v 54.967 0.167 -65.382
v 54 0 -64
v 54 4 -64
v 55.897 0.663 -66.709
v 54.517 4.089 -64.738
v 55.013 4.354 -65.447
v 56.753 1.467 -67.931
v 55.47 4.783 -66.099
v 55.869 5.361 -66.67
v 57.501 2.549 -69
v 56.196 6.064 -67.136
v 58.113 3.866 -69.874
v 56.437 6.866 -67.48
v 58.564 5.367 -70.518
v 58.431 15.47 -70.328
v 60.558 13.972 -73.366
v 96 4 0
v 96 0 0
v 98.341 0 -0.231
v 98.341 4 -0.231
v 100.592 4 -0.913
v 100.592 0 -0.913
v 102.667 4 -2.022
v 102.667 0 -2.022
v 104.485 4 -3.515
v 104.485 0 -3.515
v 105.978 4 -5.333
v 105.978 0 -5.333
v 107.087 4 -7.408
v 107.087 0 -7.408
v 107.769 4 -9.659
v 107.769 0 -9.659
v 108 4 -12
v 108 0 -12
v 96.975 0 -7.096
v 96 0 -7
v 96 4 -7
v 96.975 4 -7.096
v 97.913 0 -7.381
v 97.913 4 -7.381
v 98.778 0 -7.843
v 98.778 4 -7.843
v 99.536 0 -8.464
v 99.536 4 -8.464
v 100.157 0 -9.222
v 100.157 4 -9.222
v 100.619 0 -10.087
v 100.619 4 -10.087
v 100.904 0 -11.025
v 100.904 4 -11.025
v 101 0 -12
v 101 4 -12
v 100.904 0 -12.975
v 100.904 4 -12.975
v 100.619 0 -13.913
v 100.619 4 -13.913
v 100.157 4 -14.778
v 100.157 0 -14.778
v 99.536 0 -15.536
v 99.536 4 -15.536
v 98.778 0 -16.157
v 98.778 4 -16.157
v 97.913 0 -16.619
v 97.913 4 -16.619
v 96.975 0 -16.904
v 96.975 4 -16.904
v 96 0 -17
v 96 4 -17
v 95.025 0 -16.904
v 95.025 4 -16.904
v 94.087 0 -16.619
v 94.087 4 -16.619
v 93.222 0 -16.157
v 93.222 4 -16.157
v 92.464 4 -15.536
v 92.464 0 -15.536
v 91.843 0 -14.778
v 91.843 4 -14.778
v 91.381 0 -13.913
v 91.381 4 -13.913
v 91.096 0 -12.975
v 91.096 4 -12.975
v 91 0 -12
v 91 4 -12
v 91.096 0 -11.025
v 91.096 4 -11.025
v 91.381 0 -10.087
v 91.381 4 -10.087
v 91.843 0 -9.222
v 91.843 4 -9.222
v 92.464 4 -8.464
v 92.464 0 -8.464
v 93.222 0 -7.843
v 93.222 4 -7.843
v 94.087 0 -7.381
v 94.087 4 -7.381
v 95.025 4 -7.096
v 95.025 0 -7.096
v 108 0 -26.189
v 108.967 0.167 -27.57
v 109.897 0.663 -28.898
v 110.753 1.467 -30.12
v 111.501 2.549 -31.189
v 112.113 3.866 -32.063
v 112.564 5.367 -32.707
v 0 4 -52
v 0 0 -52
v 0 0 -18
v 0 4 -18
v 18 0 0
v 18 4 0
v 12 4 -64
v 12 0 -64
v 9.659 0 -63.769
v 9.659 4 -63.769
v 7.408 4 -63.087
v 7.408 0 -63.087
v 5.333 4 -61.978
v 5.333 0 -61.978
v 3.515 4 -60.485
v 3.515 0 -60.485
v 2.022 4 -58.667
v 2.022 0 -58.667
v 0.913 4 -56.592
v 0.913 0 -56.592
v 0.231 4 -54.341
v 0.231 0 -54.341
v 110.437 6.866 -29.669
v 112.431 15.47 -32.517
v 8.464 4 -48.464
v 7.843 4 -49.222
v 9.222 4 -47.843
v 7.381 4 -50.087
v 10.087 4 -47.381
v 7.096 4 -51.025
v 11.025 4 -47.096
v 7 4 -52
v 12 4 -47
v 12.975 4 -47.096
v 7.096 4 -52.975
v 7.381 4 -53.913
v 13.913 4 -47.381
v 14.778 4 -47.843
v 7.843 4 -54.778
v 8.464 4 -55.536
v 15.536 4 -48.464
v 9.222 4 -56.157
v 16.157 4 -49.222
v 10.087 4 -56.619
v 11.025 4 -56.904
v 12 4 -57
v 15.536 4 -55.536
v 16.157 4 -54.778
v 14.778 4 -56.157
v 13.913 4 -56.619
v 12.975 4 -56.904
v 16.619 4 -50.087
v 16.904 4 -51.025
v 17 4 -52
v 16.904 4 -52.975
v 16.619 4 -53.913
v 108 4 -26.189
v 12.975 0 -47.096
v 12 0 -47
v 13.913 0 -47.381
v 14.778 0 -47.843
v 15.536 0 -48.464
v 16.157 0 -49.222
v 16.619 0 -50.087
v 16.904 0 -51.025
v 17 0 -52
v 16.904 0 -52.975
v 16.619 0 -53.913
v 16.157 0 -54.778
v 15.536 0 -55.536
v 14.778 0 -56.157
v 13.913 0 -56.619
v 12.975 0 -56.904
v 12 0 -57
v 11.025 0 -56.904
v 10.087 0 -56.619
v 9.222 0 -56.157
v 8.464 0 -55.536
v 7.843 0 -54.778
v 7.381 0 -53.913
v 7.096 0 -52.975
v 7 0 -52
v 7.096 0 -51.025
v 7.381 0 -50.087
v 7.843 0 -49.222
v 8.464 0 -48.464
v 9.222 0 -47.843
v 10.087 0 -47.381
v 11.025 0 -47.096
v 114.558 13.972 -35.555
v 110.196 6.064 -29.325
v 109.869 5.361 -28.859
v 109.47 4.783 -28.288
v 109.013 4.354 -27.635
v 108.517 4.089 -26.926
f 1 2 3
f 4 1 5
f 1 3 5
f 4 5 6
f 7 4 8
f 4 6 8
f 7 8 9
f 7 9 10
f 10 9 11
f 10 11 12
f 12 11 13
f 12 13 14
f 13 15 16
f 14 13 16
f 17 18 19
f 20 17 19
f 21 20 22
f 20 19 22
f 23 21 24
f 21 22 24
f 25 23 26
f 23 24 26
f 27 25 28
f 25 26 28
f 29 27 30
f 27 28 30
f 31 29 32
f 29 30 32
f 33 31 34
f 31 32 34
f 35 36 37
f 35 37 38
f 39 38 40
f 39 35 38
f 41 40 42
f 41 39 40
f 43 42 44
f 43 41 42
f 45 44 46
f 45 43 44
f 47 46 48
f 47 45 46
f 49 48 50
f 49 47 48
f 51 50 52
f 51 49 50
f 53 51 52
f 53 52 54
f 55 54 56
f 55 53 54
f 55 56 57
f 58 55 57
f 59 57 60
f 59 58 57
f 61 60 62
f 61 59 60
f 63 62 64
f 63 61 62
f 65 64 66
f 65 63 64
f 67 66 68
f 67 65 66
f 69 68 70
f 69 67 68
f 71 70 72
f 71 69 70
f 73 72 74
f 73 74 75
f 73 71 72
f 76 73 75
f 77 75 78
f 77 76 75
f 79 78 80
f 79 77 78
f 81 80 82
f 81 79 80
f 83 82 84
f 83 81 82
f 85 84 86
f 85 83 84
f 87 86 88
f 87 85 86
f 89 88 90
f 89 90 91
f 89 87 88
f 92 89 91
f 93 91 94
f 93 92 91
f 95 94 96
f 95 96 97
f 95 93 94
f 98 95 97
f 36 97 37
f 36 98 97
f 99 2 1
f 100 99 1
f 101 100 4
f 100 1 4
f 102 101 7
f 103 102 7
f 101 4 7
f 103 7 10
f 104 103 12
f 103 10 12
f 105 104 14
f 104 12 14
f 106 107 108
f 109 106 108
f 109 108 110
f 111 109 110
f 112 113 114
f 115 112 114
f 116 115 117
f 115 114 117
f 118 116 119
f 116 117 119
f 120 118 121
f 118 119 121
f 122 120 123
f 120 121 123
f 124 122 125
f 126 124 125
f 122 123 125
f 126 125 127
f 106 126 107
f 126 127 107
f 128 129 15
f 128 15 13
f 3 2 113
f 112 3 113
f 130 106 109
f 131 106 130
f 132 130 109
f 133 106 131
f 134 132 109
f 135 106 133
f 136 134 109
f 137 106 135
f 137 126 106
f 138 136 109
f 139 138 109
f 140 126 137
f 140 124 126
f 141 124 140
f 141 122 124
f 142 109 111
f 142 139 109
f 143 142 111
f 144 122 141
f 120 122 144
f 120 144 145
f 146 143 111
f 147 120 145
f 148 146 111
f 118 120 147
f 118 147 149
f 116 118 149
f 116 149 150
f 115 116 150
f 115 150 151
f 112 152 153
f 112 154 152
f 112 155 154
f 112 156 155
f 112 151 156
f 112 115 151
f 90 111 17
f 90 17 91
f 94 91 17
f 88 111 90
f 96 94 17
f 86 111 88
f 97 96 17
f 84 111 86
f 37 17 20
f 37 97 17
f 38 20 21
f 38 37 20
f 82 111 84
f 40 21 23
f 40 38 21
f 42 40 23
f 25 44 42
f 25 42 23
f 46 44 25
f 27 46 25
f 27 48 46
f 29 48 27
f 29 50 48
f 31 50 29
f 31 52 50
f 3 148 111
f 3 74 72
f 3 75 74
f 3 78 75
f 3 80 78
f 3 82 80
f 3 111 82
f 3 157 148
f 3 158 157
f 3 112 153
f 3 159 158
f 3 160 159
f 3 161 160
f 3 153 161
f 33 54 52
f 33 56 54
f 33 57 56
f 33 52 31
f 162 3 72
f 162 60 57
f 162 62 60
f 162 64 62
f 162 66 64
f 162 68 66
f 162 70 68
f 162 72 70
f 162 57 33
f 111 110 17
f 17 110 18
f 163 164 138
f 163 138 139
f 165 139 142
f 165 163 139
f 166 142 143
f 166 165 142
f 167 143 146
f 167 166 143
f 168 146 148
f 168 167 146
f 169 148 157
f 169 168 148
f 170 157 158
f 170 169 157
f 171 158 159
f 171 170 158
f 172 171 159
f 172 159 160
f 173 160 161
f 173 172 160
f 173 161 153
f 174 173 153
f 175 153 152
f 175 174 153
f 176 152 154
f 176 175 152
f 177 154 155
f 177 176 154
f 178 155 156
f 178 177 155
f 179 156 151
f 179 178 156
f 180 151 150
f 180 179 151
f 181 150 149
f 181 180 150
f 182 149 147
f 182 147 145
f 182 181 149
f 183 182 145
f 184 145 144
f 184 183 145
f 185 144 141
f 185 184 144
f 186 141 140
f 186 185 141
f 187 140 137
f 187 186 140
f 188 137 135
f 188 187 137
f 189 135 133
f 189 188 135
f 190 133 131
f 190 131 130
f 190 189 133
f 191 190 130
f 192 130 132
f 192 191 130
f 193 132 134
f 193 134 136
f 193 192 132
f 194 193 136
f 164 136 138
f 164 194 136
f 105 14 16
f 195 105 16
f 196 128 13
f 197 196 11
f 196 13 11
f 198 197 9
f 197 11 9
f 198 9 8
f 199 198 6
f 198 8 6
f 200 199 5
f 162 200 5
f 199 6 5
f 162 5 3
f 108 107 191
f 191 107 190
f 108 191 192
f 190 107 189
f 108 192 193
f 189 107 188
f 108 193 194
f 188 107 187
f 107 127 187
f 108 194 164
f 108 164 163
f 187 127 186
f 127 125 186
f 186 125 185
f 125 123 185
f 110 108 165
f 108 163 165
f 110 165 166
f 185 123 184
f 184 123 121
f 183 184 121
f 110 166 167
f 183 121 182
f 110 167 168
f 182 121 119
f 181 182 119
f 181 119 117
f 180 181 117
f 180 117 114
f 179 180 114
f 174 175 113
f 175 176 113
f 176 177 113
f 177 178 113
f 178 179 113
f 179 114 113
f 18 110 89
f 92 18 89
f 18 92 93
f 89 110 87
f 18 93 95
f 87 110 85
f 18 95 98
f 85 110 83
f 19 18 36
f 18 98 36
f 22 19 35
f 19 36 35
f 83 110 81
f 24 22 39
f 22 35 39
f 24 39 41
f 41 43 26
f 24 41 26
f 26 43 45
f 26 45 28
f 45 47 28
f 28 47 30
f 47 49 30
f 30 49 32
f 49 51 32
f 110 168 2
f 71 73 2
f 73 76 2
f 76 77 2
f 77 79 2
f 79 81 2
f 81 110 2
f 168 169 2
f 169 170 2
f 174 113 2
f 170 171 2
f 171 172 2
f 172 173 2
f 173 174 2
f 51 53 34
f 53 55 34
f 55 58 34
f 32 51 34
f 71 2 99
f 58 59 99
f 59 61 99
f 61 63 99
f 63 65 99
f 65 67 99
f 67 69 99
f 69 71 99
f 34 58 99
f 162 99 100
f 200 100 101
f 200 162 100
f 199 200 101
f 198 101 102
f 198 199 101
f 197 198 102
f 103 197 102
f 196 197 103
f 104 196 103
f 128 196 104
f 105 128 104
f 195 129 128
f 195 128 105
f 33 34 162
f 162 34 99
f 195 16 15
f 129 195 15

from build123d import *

# Parameters (mm, degrees)
SKETCH2_R           = 5
BOSS_EXTRUDE2_DEPTH = 4
BOSS_EXTRUDE3_DEPTH = 65.921828


with BuildPart() as part:
    # Sketch2 → Boss-Extrude2 (new body)
    with BuildSketch(Plane(origin=(0, 0, 0), x_dir=(1, 0, 0), z_dir=(0, 1, 0))):
        with BuildLine():
            Line((0, 18), (18, 0))
            Line((18, 0), (96, 0))
            ThreePointArc((96, 0), (104.485281374, 3.514718626), (108, 12))
            Line((108, 12), (108, 26.188792937))
            Line((108, 26.188792937), (54, 64))
            Line((54, 64), (12, 64))
            ThreePointArc((12, 64), (3.514718626, 60.485281374), (0, 52))
            Line((0, 52), (0, 18))
        make_face()
        with Locations(Location((12, 52, 0), (0, 0, 270))):
            Circle(SKETCH2_R, mode=Mode.SUBTRACT)
        with Locations(Location((96, 12, 0), (0, 0, 270))):
            Circle(SKETCH2_R, mode=Mode.SUBTRACT)
    extrude(amount=BOSS_EXTRUDE2_DEPTH)

    # Sketch6 → Boss-Extrude3 (add)
    with BuildSketch(Plane(origin=(6.164380005, 0, 4.316345348), x_dir=(0.5735764363510455, 0, -0.8191520442889922), z_dir=(0.8191520442889922, 0, 0.5735764363510455))):
        with BuildLine():
            Line((91.356422356, 5.367444663), (94.832896583, 13.972020318))
            Line((94.832896583, 13.972020318), (91.124161165, 15.470446692))
            Line((91.124161165, 15.470446692), (87.647686938, 6.865871037))
            ThreePointArc((87.647686938, 6.865871037), (85.96136502, 4.783436896), (83.398858397, 4))
            Line((83.398858397, 4), (83.398858397, 0))
            ThreePointArc((83.398858397, 0), (88.198136634, 1.467286606), (91.356422356, 5.367444663))
        make_face()
    extrude(amount=BOSS_EXTRUDE3_DEPTH)


solid = part.part
